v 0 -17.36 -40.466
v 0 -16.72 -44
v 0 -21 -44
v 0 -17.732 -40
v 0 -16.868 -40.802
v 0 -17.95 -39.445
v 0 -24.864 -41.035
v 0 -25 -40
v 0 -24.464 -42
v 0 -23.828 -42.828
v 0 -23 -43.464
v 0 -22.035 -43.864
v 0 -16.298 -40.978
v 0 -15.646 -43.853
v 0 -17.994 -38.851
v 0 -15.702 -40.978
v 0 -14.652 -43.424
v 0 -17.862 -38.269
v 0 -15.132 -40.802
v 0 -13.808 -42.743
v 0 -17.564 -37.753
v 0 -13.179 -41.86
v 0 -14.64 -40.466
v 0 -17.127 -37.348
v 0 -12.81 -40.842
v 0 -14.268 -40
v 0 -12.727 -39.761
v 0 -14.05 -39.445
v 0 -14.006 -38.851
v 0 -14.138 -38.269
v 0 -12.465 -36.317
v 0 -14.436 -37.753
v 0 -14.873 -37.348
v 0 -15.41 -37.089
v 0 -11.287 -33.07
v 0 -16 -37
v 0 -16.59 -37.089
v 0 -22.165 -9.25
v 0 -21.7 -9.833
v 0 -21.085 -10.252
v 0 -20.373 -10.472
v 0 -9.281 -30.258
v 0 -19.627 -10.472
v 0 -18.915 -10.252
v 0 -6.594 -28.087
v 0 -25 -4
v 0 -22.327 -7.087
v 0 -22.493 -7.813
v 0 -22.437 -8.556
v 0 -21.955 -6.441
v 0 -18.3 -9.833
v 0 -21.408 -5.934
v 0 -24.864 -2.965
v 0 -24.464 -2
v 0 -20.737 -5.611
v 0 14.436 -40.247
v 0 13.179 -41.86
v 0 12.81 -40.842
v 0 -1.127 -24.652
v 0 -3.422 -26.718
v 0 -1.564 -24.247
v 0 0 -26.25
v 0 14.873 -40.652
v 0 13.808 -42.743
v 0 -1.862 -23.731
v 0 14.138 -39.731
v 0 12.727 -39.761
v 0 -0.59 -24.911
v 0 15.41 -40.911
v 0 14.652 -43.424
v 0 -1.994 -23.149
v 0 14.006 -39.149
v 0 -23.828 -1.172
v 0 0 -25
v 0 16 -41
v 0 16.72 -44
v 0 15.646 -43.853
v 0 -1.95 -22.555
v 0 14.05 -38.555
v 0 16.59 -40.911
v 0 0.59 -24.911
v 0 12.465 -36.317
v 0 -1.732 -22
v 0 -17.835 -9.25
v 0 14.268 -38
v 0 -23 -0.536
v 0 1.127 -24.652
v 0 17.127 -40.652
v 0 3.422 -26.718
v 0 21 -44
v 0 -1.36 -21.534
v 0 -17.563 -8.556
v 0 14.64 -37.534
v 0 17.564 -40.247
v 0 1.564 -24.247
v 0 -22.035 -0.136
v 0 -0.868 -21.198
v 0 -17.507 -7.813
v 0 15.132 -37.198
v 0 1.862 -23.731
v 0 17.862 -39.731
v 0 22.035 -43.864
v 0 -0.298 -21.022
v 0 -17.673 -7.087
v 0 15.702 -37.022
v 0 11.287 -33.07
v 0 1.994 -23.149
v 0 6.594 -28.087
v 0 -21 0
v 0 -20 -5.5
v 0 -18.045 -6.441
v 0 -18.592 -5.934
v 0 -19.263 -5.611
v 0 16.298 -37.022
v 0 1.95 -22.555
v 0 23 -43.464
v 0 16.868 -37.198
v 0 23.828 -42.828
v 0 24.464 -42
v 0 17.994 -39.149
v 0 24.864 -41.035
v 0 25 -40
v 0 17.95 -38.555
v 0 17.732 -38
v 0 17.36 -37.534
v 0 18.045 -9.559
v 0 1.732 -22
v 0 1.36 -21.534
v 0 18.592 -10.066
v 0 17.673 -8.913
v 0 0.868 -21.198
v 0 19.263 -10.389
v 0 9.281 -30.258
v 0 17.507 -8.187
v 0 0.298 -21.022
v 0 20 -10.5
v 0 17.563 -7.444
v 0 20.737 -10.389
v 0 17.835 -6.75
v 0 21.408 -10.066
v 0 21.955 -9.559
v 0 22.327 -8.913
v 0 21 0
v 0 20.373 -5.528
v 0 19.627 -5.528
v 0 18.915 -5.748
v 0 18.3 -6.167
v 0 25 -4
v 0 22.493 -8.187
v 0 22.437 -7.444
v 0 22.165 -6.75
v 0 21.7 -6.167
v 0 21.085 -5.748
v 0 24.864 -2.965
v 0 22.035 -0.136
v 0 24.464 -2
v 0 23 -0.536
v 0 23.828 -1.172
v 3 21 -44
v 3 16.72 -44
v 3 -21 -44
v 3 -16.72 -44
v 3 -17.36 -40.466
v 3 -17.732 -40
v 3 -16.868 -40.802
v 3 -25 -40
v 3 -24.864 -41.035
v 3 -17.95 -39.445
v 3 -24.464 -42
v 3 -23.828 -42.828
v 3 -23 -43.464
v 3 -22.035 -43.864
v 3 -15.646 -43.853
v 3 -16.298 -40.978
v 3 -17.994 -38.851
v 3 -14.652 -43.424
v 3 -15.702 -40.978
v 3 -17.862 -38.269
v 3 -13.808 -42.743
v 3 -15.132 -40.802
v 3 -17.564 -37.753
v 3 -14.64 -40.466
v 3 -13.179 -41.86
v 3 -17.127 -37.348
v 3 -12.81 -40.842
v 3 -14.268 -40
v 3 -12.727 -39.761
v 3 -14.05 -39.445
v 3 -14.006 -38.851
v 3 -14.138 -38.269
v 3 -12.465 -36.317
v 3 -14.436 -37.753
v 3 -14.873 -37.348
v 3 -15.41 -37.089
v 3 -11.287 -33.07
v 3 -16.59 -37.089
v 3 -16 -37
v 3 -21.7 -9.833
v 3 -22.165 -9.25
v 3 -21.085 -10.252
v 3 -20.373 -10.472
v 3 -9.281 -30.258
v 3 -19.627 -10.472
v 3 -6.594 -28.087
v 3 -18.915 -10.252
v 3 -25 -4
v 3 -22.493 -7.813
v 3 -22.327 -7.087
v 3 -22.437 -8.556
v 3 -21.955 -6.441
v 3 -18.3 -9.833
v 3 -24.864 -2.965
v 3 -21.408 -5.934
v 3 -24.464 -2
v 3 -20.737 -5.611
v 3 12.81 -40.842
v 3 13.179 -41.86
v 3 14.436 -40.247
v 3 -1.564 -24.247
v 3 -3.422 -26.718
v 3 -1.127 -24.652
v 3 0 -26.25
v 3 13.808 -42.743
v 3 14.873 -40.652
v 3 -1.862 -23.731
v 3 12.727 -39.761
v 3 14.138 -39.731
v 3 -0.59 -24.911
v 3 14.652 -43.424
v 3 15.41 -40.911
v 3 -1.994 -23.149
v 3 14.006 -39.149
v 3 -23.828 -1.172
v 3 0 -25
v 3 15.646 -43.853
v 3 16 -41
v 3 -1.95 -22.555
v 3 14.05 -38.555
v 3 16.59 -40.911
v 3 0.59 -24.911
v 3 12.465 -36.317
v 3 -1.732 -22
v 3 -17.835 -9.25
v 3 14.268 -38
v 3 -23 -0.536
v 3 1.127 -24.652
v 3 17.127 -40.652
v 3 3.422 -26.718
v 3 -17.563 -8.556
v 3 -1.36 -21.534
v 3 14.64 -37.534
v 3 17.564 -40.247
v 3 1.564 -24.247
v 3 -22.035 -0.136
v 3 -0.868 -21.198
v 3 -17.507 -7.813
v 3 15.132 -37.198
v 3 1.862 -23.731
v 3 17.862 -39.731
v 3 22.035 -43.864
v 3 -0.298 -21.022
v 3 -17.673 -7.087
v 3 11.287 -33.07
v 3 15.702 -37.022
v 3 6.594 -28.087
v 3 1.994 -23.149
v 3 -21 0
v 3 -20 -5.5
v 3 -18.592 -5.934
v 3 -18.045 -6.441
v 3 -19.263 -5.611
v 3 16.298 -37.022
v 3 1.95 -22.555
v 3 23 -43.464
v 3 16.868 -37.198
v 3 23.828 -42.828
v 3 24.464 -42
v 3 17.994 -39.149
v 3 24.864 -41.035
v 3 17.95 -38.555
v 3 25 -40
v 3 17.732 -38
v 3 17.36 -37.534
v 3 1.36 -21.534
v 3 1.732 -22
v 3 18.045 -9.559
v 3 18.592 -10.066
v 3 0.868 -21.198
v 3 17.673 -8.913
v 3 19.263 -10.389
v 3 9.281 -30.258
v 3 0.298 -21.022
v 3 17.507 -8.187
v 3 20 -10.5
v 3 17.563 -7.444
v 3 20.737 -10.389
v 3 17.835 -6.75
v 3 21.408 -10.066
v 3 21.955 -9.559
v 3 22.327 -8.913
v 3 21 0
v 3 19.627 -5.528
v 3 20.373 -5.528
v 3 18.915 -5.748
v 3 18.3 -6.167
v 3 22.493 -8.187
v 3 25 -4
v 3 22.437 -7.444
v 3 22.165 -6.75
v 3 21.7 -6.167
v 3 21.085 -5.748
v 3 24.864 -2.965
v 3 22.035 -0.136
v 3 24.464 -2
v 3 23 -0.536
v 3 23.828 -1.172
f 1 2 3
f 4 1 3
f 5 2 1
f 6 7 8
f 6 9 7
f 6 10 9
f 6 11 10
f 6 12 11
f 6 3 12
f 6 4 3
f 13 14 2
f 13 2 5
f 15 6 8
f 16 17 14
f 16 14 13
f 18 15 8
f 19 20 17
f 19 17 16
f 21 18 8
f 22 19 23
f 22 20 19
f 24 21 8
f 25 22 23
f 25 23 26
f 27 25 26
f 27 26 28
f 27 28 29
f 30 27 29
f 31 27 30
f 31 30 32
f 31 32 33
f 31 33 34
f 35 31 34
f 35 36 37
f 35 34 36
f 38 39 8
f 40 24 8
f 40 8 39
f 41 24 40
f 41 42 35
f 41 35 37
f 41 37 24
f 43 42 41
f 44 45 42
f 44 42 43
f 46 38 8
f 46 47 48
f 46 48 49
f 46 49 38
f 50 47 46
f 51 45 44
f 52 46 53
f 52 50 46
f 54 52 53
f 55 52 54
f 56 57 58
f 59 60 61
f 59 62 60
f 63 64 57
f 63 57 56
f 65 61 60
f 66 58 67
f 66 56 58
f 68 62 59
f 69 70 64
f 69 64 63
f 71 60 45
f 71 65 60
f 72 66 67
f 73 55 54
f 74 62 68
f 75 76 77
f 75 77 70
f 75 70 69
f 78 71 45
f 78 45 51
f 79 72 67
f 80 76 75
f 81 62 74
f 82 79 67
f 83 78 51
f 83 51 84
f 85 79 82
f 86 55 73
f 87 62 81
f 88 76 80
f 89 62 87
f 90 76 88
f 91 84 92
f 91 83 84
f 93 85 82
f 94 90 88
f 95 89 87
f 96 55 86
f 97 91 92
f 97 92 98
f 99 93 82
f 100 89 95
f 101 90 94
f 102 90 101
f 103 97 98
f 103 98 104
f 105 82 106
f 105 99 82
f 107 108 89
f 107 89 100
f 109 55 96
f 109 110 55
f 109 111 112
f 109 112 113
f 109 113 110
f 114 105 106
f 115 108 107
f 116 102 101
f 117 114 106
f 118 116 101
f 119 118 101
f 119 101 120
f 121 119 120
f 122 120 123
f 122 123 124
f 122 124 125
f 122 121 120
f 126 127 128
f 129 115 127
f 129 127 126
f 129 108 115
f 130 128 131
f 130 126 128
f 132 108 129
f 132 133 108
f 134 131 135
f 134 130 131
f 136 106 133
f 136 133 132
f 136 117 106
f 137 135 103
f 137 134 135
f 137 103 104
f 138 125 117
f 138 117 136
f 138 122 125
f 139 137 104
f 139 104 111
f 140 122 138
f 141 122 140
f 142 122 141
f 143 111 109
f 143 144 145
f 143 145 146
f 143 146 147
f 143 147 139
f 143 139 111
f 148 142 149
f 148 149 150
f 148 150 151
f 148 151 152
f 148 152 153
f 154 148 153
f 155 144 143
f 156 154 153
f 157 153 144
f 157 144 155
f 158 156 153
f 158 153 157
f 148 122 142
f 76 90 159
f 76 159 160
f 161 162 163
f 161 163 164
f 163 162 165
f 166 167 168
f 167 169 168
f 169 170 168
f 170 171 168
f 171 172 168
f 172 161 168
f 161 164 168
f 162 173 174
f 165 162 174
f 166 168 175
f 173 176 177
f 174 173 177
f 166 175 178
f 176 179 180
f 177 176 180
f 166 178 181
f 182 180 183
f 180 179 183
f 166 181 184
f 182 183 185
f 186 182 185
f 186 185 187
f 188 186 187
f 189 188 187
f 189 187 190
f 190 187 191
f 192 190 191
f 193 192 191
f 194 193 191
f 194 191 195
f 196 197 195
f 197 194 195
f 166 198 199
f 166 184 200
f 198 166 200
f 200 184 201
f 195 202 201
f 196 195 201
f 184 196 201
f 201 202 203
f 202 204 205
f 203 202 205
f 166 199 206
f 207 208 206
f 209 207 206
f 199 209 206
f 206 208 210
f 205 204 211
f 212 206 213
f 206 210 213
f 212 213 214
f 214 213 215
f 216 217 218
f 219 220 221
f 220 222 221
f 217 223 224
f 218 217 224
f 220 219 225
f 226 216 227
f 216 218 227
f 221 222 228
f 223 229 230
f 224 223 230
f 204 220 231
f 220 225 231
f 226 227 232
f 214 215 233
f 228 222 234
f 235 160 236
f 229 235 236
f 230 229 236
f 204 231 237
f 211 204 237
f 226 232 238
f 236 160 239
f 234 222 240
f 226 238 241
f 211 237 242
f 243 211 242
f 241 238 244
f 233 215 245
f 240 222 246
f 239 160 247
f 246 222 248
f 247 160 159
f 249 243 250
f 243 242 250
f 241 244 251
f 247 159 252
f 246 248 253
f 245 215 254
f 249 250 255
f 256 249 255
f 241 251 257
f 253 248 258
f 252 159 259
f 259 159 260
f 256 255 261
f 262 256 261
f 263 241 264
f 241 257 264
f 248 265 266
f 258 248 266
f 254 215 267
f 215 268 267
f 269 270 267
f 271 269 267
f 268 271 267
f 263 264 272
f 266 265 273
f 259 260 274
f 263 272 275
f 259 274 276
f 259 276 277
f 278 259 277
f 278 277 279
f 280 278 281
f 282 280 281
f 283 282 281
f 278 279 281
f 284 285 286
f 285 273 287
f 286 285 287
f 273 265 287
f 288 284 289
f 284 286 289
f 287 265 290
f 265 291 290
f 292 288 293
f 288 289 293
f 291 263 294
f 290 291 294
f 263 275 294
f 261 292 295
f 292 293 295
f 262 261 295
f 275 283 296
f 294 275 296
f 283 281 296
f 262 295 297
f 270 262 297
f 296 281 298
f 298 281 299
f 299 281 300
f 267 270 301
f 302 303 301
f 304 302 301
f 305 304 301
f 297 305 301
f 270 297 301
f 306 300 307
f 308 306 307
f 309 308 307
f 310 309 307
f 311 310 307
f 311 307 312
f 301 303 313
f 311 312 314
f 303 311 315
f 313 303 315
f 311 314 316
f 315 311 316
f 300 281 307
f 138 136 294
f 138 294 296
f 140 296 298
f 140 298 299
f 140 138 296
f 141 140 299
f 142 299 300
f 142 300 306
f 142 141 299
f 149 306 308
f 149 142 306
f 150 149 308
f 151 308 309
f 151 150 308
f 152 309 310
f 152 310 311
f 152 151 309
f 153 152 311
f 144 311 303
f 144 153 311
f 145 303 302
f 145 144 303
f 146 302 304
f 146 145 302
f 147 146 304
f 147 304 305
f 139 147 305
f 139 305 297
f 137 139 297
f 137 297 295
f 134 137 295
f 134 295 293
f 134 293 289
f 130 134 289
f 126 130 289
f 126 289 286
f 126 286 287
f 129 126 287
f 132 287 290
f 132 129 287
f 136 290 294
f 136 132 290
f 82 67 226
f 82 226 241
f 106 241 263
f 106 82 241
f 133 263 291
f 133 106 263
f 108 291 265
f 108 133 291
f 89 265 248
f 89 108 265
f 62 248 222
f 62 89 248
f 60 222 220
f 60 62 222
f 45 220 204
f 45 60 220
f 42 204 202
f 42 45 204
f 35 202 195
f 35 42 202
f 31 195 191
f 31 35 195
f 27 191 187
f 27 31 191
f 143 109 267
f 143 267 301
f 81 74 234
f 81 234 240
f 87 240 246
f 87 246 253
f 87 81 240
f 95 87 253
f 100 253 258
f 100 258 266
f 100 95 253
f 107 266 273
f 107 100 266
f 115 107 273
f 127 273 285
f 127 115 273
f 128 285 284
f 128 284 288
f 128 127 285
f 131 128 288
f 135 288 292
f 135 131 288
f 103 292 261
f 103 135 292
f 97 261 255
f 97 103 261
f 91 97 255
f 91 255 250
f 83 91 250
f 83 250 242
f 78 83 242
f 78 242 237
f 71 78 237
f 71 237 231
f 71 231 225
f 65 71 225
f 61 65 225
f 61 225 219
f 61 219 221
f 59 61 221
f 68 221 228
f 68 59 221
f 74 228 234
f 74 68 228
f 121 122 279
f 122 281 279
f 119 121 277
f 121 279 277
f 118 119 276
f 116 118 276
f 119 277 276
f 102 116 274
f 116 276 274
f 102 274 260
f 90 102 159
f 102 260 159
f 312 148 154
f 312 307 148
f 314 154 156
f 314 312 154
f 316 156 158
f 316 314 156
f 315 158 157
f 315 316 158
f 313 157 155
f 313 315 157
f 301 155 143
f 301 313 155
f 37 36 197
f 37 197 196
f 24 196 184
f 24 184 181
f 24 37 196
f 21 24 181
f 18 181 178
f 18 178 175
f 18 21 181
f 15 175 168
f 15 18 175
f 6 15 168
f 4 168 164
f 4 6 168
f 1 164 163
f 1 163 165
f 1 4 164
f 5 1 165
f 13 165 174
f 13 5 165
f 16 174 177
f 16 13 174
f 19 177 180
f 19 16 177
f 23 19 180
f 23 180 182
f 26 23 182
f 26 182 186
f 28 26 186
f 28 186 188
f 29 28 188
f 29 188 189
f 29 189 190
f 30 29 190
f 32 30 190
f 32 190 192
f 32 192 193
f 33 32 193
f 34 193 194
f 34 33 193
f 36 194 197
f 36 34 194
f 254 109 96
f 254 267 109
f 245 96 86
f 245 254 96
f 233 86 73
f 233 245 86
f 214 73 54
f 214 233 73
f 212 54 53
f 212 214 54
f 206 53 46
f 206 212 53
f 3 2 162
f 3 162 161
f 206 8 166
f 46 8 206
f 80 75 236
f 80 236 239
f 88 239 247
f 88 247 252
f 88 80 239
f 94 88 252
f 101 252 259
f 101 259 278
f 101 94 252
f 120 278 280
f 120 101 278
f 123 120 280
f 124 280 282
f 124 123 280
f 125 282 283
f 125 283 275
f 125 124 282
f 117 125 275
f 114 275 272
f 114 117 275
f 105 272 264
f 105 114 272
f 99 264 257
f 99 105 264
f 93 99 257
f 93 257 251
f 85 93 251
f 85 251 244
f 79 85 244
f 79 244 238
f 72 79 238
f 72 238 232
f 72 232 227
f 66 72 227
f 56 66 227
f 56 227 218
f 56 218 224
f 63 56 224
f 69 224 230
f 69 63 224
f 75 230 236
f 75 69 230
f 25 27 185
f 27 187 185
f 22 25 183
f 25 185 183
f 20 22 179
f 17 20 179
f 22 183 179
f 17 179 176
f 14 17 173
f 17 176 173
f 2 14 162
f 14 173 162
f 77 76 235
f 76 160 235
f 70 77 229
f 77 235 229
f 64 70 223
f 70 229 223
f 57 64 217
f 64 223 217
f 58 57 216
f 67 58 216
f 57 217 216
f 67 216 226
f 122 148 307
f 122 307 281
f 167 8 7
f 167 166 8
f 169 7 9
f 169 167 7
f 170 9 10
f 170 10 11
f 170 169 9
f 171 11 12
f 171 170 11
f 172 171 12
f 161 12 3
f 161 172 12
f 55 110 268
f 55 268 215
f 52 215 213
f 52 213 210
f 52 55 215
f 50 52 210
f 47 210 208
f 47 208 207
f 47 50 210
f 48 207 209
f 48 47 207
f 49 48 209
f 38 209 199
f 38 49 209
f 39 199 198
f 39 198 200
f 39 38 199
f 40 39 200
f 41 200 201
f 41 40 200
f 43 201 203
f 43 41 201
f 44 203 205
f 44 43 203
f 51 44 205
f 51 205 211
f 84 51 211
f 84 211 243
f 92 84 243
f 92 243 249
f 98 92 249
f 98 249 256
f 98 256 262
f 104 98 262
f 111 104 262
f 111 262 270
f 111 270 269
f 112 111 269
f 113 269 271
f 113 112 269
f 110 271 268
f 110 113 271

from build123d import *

# Parameters (mm, degrees)
ESQUISSE1_R        = 2
ESQUISSE1_R_2      = 2.5
BOSS_EXTRU_1_DEPTH = 3
CONG_1_R           = 4


with BuildPart() as part:
    # Esquisse1 → Boss.-Extru.1 (new body)
    with BuildSketch(Plane(origin=(0, 0, 0), x_dir=(0, 0, -1), z_dir=(1, 0, 0))):
        with BuildLine():
            Line((0, 25), (44, 25))
            Line((44, 25), (44, 11.728704106))
            ThreePointArc((44, 11.728704106), (26.25, 0), (44, -11.728704106))
            Line((44, -11.728704106), (44, -25))
            Line((44, -25), (0, -25))
            Line((0, -25), (0, 25))
        make_face()
        with Locations((39, 16)):
            Circle(ESQUISSE1_R, mode=Mode.SUBTRACT)
        with Locations((23, 0)):
            Circle(ESQUISSE1_R, mode=Mode.SUBTRACT)
        with Locations(Location((39, -16, 0), (0, 0, 180))):
            Circle(ESQUISSE1_R, mode=Mode.SUBTRACT)
        with Locations((8, 20)):
            Circle(ESQUISSE1_R_2, mode=Mode.SUBTRACT)
        with Locations(Location((8, -20, 0), (0, 0, 180))):
            Circle(ESQUISSE1_R_2, mode=Mode.SUBTRACT)
    extrude(amount=BOSS_EXTRU_1_DEPTH)

    # Congé1
    cong_1_edges = [part.edges().sort_by_distance(p)[0] for p in [
        (1.5, 25, 0),
        (1.5, 25, -44),
        (1.5, 11.728704106, -44),
        (1.5, -11.728704106, -44),
        (1.5, -25, -44),
        (1.5, -25, 0),
    ]]
    fillet(cong_1_edges, radius=CONG_1_R)


solid = part.part
